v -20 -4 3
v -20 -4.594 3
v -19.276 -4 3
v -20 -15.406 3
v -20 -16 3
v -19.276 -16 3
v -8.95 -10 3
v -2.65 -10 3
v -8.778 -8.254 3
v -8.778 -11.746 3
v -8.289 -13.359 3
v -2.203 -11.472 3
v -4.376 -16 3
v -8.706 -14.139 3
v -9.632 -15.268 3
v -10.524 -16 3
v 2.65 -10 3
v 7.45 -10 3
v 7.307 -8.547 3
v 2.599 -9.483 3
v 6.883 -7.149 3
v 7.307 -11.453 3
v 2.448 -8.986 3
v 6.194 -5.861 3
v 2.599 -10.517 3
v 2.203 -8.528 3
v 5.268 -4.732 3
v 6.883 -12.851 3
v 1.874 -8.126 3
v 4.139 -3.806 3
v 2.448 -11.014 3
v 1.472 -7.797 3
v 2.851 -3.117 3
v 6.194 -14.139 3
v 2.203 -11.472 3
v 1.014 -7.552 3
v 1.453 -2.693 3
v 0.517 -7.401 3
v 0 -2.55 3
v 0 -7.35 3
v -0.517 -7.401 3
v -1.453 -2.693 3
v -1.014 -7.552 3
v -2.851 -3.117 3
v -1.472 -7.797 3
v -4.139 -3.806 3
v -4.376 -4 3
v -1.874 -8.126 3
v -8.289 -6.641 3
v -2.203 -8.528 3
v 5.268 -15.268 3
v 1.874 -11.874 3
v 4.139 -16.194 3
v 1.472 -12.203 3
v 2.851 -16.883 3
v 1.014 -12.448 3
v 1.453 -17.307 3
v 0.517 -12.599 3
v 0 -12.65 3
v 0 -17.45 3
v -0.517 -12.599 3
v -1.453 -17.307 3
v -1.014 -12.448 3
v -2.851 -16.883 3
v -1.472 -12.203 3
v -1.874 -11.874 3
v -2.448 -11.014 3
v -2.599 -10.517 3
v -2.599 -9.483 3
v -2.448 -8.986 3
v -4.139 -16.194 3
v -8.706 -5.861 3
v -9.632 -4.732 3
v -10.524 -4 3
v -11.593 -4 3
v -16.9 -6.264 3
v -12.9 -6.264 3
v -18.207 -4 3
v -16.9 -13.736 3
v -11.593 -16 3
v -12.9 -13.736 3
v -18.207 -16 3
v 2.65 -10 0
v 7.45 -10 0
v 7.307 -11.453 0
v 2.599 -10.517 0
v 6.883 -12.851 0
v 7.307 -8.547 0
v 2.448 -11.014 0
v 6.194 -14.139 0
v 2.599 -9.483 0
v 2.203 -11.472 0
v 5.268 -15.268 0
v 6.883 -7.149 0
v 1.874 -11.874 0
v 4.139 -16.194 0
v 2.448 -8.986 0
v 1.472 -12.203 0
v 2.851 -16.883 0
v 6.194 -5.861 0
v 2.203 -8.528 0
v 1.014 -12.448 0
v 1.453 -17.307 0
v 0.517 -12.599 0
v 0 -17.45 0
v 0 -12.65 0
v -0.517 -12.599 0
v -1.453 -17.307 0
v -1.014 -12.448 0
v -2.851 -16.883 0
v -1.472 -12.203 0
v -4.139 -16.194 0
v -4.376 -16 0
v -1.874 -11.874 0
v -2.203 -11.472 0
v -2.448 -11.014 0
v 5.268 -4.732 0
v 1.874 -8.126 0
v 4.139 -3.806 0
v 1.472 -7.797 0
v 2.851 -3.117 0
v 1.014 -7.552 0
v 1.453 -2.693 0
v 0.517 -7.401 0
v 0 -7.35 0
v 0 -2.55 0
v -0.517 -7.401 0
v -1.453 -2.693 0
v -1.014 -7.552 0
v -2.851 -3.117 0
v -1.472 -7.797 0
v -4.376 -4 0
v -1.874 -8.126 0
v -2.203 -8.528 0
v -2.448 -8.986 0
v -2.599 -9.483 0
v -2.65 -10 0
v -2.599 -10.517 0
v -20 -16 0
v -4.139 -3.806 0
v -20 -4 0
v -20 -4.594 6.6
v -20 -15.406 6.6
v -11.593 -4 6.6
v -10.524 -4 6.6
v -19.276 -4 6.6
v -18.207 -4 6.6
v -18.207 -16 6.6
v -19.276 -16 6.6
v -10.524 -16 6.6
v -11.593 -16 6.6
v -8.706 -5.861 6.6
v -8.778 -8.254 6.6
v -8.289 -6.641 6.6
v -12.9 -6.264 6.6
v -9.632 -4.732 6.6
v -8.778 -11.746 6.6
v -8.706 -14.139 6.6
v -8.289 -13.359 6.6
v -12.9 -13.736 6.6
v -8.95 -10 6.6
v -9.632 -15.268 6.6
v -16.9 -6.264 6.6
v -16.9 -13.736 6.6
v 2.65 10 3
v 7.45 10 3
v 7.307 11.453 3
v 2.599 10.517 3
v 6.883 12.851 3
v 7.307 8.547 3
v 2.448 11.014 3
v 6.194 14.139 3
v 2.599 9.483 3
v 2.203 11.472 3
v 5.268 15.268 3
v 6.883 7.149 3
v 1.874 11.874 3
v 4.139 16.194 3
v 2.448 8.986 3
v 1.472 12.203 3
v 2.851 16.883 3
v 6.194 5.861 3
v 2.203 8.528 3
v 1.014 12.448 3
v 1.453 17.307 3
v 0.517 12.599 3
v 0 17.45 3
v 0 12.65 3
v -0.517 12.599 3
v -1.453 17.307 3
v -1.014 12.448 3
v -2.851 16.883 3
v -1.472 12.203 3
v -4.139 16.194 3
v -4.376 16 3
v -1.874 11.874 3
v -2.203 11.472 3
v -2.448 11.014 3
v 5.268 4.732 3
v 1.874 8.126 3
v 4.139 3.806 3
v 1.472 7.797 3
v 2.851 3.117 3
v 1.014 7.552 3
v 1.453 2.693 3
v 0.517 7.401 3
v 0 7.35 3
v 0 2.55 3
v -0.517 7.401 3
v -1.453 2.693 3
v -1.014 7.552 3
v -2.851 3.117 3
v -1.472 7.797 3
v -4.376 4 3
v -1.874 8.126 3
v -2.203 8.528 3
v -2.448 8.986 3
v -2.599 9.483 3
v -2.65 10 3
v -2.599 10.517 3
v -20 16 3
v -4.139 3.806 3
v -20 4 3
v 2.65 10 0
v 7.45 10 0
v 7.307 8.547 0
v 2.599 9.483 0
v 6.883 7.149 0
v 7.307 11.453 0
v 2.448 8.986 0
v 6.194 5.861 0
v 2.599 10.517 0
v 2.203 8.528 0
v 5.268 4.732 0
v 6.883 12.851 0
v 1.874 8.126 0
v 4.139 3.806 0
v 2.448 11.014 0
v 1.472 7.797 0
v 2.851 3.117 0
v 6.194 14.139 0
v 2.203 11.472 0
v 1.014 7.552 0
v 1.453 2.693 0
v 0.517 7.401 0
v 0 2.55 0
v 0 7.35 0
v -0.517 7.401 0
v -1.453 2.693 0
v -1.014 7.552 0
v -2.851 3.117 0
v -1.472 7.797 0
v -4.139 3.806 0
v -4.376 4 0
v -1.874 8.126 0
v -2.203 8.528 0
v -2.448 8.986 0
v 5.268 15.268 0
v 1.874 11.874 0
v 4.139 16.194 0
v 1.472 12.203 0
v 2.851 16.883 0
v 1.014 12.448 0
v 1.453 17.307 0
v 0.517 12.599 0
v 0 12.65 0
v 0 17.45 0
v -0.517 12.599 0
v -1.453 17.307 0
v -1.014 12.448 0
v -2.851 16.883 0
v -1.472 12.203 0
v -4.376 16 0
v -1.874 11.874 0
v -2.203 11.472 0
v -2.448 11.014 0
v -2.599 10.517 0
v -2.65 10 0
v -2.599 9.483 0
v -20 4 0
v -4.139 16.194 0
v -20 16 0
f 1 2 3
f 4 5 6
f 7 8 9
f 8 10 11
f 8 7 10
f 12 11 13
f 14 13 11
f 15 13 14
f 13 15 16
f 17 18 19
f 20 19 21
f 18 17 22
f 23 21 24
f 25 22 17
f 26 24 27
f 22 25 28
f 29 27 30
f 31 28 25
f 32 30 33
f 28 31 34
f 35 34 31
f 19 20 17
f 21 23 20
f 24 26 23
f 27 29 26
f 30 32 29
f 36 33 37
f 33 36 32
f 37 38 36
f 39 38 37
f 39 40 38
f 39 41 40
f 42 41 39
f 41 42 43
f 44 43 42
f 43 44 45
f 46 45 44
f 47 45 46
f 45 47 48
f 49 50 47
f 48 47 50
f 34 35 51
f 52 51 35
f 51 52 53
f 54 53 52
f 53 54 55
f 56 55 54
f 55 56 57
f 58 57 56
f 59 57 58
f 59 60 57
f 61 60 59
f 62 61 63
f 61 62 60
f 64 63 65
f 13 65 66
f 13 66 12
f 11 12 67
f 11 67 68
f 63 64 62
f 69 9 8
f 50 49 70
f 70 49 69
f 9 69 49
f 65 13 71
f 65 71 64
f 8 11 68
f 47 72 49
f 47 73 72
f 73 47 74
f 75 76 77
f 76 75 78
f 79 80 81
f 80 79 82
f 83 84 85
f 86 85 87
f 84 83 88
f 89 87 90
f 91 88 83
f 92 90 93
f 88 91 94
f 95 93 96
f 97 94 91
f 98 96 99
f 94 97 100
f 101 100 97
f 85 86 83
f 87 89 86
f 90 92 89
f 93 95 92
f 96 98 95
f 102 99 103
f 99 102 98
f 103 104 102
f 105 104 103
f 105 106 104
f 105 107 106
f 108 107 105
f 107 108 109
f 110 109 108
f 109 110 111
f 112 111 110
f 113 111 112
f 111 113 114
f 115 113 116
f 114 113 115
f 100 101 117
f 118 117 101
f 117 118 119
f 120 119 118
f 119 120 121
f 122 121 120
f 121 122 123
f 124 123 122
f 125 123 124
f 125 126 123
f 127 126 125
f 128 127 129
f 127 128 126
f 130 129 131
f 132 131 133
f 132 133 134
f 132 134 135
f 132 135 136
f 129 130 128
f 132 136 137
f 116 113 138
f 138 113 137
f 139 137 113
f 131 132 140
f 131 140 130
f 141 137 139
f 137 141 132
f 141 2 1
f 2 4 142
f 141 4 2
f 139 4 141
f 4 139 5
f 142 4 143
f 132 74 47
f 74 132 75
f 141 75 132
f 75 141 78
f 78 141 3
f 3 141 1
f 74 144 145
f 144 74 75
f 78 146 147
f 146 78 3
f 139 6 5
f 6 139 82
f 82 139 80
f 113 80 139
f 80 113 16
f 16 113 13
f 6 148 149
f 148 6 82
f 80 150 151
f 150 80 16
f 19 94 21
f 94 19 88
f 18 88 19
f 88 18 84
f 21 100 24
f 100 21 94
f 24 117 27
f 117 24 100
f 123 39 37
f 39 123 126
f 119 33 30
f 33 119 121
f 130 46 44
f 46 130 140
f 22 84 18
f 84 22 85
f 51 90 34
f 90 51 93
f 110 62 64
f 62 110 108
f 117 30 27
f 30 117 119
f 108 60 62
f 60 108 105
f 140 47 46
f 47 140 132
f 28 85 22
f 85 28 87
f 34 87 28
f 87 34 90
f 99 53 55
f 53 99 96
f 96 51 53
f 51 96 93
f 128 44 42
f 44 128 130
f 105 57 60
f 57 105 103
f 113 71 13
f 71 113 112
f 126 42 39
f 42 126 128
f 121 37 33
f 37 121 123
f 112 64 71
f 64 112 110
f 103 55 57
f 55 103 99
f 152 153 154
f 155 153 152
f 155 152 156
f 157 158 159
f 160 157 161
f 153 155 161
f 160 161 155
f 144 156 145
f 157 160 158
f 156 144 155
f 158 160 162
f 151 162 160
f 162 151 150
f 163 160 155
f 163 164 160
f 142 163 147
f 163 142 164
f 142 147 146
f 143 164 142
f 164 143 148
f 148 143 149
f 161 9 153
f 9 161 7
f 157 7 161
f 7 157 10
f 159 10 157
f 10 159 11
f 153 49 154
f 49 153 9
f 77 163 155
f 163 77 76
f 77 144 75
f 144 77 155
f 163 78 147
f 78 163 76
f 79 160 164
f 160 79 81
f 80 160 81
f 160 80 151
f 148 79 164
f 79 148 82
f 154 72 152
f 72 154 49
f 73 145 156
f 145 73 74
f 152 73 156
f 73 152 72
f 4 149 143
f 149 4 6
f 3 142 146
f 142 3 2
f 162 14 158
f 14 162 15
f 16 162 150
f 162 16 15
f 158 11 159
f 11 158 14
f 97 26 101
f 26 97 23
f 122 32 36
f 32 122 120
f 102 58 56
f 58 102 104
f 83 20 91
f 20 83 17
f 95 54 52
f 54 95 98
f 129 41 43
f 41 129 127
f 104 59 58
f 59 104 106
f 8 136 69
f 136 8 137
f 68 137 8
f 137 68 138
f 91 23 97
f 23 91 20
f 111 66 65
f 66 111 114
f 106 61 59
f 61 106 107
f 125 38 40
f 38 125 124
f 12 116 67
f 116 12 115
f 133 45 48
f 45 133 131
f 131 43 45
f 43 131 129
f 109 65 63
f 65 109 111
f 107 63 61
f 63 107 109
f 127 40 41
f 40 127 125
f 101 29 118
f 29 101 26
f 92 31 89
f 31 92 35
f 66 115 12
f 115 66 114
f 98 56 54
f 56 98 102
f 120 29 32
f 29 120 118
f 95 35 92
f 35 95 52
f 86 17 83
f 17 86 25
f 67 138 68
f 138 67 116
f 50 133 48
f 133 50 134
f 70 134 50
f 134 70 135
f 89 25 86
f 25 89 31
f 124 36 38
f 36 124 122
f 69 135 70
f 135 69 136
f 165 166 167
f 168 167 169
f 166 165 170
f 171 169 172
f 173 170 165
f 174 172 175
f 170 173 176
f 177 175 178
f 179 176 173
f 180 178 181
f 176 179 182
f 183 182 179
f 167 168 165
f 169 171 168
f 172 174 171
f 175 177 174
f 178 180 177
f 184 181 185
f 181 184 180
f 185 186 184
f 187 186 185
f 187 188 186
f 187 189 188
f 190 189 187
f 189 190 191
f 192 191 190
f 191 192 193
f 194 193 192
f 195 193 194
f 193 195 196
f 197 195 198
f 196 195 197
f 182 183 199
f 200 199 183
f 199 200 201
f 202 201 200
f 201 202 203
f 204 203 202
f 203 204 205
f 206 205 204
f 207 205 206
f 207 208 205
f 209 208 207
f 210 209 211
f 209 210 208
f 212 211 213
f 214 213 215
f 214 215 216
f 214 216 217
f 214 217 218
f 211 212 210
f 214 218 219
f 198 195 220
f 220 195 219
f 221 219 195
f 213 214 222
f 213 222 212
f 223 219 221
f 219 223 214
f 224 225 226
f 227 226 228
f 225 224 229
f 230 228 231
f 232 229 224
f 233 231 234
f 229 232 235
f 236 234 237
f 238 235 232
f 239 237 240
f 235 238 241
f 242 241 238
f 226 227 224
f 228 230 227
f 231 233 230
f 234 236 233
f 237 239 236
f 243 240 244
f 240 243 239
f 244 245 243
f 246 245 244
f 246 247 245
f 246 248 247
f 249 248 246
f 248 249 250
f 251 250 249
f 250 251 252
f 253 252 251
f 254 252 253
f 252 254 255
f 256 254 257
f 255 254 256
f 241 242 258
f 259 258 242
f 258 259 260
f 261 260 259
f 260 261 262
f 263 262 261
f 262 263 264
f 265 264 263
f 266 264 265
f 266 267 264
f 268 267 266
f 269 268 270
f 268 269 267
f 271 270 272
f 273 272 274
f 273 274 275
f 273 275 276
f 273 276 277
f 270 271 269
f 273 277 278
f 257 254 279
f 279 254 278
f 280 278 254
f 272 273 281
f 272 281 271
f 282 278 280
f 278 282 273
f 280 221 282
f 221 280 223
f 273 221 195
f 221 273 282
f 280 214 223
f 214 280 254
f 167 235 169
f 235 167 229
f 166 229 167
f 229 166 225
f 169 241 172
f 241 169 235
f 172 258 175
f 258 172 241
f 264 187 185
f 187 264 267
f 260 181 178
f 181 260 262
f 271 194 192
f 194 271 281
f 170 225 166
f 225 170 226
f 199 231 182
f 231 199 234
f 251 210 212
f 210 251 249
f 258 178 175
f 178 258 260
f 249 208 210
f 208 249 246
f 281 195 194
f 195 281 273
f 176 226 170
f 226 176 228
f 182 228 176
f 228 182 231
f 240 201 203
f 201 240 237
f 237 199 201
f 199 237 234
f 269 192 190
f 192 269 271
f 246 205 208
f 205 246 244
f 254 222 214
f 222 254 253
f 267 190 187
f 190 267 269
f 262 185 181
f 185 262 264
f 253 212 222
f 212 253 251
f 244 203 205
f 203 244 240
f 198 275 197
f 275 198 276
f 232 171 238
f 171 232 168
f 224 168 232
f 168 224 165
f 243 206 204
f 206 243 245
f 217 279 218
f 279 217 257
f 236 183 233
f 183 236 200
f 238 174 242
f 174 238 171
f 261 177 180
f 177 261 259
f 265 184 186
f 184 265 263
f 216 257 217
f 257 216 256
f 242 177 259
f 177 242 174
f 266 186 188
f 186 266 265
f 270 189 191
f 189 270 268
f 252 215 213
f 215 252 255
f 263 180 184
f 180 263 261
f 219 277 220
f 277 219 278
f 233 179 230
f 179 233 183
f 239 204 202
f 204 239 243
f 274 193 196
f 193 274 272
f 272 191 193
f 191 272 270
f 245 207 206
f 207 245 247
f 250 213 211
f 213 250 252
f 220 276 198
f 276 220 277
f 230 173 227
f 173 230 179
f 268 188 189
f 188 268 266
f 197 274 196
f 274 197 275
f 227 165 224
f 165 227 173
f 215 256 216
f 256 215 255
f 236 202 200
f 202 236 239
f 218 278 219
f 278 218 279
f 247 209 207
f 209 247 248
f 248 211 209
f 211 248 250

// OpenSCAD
// file: simple_objects.scad
//
// Simple objects
//
// By Jay Abbott 2013
//



/**
 * Box
 *
 * Draws a simple box with dimensions provided in the sz vector.
 *
 * The origin (transformation centre) of the box is controlled by the
 * cx, cy, and cz parameters. 0 for any axis means that the lower-extent
 * of the box is at the origin, and the box extends entirely in the
 * positive direction along that axis. 1 means the upper-edge of the
 * box is at the origin, and the box extends entirely in the negative
 * direction along that axis.
 *
 * The default centre-value is 0.5 for all axes so that the
 * origin of the box is in the centre of the box shape.
 *
 * @param sz	A vector with the [x, y, z] dimensions.
 * @param cx	The x-center
 * @param cy	The y-center
 * @param cz	The z-center
 */

module box(
	sz	= [1, 1, 1],
	cx	= 0.5,
	cy	= 0.5,
	cz	= 0.5)
{
	translate([-sz[0] * cx, -sz[1] * cy, -sz[2] * cz])
		cube(sz);
}
// file: mounting_prongs.scad
//
// GoPro Mounting Prongs
//
// By Jay Abbott 2014
//

use <simple_objects.scad>;



// Constants
// --------------------------------

detail = 32;

ringDiameter = 14.9;
plateWidth = 12;
plateLength = 20;
prongThicknesses = [3, 3, 3.6, 3, 3];

nutHeight = 3.5;
nutDiameter = 10;
holeDiameter = 5.3;



// Modules
// --------------------------------

module prongBody(depth = 1)
{
	union()
	{
		// Mount plate (box and cylinder)
		box([plateLength, plateWidth, depth], cx = 1, cz = 0);
		cylinder(r = ringDiameter / 2, h = depth, $fn = detail);
	}
}

module prongSeparator(elevation = 1, depth = 1, clearance = 1.5)
{
	height = elevation + depth;

	intersection()
	{
		difference()
		{
			// Over-sized mount plate
			box([plateLength, plateWidth, height], cx = 1, cz = 0);
			// Cut-out section
			translate([0, 0, -0.1])
				cylinder(r = (ringDiameter / 2) + clearance, h = height + 0.2, $fn = detail);

			// Notches - for extra strength when attaching using sugru
			translate([-ringDiameter, plateWidth * 0.6, -0.1])
				cylinder(r = plateWidth / 3, h = height + 0.2, $fn = 6);
			translate([-ringDiameter, -plateWidth * 0.6, -0.1])
				cylinder(r = plateWidth / 3, h = height + 0.2, $fn = 6);
		}

		translate([-ringDiameter, 0, -0.1])
			cylinder(r = ringDiameter / 2, h = height + 0.2, $fn = detail);
	}
}

module nutHousing(elevation = 1, depth = 1)
{
	height = elevation + depth;

	difference()
	{
		// Housing
		intersection()
		{
			translate([0, 0, elevation])
				sphere(r = ringDiameter / 2, $fn = detail);
			cylinder(r = ringDiameter / 2, h = height, $fn = detail);
		}

		// Nut hole
		translate([0, 0, -0.1])
			cylinder(r = nutDiameter / 2, h = height + 0.2, $fn = 6);
	}
}

module prongLayer(depth = 1, separatorHeight = 0, nutHousing = false)
{
	difference()
	{
		union()
		{
			// Main prong body
			prongBody(depth);

			// Nut housing
			if(nutHousing)
			{
				nutHousing(depth, nutHeight);
			}

			// Separator
			prongSeparator(depth, separatorHeight);
		}

		// Central hole
		translate([0, 0, -0.1])
			cylinder(r = holeDiameter / 2, h = depth + 0.2, $fn = detail);
	}
}

module prong(layer = 0)
{
	if(layer == 1)
	{
		prongLayer(prongThicknesses[0], prongThicknesses[1]);
	}
	if(layer == 2)
	{
		prongLayer(prongThicknesses[1], prongThicknesses[2]);
	}
	if(layer == 3)
	{
		prongLayer(prongThicknesses[2], prongThicknesses[3]);
	}
	if(layer == 4)
	{
		prongLayer(prongThicknesses[3], 0);
	}
	if(layer == 5)
	{
		prongLayer(prongThicknesses[4], 0, true);
	}
}
// main file
//
// GoPro Two Prong Connector
//
// By Jay Abbott 2014
//

use <mounting_prongs.scad>



// The model
// --------------------------------

// Bottom prong
translate([0,-10,0])
	prong(2);

// Top prong
translate([0,10,0])
	prong(4);
